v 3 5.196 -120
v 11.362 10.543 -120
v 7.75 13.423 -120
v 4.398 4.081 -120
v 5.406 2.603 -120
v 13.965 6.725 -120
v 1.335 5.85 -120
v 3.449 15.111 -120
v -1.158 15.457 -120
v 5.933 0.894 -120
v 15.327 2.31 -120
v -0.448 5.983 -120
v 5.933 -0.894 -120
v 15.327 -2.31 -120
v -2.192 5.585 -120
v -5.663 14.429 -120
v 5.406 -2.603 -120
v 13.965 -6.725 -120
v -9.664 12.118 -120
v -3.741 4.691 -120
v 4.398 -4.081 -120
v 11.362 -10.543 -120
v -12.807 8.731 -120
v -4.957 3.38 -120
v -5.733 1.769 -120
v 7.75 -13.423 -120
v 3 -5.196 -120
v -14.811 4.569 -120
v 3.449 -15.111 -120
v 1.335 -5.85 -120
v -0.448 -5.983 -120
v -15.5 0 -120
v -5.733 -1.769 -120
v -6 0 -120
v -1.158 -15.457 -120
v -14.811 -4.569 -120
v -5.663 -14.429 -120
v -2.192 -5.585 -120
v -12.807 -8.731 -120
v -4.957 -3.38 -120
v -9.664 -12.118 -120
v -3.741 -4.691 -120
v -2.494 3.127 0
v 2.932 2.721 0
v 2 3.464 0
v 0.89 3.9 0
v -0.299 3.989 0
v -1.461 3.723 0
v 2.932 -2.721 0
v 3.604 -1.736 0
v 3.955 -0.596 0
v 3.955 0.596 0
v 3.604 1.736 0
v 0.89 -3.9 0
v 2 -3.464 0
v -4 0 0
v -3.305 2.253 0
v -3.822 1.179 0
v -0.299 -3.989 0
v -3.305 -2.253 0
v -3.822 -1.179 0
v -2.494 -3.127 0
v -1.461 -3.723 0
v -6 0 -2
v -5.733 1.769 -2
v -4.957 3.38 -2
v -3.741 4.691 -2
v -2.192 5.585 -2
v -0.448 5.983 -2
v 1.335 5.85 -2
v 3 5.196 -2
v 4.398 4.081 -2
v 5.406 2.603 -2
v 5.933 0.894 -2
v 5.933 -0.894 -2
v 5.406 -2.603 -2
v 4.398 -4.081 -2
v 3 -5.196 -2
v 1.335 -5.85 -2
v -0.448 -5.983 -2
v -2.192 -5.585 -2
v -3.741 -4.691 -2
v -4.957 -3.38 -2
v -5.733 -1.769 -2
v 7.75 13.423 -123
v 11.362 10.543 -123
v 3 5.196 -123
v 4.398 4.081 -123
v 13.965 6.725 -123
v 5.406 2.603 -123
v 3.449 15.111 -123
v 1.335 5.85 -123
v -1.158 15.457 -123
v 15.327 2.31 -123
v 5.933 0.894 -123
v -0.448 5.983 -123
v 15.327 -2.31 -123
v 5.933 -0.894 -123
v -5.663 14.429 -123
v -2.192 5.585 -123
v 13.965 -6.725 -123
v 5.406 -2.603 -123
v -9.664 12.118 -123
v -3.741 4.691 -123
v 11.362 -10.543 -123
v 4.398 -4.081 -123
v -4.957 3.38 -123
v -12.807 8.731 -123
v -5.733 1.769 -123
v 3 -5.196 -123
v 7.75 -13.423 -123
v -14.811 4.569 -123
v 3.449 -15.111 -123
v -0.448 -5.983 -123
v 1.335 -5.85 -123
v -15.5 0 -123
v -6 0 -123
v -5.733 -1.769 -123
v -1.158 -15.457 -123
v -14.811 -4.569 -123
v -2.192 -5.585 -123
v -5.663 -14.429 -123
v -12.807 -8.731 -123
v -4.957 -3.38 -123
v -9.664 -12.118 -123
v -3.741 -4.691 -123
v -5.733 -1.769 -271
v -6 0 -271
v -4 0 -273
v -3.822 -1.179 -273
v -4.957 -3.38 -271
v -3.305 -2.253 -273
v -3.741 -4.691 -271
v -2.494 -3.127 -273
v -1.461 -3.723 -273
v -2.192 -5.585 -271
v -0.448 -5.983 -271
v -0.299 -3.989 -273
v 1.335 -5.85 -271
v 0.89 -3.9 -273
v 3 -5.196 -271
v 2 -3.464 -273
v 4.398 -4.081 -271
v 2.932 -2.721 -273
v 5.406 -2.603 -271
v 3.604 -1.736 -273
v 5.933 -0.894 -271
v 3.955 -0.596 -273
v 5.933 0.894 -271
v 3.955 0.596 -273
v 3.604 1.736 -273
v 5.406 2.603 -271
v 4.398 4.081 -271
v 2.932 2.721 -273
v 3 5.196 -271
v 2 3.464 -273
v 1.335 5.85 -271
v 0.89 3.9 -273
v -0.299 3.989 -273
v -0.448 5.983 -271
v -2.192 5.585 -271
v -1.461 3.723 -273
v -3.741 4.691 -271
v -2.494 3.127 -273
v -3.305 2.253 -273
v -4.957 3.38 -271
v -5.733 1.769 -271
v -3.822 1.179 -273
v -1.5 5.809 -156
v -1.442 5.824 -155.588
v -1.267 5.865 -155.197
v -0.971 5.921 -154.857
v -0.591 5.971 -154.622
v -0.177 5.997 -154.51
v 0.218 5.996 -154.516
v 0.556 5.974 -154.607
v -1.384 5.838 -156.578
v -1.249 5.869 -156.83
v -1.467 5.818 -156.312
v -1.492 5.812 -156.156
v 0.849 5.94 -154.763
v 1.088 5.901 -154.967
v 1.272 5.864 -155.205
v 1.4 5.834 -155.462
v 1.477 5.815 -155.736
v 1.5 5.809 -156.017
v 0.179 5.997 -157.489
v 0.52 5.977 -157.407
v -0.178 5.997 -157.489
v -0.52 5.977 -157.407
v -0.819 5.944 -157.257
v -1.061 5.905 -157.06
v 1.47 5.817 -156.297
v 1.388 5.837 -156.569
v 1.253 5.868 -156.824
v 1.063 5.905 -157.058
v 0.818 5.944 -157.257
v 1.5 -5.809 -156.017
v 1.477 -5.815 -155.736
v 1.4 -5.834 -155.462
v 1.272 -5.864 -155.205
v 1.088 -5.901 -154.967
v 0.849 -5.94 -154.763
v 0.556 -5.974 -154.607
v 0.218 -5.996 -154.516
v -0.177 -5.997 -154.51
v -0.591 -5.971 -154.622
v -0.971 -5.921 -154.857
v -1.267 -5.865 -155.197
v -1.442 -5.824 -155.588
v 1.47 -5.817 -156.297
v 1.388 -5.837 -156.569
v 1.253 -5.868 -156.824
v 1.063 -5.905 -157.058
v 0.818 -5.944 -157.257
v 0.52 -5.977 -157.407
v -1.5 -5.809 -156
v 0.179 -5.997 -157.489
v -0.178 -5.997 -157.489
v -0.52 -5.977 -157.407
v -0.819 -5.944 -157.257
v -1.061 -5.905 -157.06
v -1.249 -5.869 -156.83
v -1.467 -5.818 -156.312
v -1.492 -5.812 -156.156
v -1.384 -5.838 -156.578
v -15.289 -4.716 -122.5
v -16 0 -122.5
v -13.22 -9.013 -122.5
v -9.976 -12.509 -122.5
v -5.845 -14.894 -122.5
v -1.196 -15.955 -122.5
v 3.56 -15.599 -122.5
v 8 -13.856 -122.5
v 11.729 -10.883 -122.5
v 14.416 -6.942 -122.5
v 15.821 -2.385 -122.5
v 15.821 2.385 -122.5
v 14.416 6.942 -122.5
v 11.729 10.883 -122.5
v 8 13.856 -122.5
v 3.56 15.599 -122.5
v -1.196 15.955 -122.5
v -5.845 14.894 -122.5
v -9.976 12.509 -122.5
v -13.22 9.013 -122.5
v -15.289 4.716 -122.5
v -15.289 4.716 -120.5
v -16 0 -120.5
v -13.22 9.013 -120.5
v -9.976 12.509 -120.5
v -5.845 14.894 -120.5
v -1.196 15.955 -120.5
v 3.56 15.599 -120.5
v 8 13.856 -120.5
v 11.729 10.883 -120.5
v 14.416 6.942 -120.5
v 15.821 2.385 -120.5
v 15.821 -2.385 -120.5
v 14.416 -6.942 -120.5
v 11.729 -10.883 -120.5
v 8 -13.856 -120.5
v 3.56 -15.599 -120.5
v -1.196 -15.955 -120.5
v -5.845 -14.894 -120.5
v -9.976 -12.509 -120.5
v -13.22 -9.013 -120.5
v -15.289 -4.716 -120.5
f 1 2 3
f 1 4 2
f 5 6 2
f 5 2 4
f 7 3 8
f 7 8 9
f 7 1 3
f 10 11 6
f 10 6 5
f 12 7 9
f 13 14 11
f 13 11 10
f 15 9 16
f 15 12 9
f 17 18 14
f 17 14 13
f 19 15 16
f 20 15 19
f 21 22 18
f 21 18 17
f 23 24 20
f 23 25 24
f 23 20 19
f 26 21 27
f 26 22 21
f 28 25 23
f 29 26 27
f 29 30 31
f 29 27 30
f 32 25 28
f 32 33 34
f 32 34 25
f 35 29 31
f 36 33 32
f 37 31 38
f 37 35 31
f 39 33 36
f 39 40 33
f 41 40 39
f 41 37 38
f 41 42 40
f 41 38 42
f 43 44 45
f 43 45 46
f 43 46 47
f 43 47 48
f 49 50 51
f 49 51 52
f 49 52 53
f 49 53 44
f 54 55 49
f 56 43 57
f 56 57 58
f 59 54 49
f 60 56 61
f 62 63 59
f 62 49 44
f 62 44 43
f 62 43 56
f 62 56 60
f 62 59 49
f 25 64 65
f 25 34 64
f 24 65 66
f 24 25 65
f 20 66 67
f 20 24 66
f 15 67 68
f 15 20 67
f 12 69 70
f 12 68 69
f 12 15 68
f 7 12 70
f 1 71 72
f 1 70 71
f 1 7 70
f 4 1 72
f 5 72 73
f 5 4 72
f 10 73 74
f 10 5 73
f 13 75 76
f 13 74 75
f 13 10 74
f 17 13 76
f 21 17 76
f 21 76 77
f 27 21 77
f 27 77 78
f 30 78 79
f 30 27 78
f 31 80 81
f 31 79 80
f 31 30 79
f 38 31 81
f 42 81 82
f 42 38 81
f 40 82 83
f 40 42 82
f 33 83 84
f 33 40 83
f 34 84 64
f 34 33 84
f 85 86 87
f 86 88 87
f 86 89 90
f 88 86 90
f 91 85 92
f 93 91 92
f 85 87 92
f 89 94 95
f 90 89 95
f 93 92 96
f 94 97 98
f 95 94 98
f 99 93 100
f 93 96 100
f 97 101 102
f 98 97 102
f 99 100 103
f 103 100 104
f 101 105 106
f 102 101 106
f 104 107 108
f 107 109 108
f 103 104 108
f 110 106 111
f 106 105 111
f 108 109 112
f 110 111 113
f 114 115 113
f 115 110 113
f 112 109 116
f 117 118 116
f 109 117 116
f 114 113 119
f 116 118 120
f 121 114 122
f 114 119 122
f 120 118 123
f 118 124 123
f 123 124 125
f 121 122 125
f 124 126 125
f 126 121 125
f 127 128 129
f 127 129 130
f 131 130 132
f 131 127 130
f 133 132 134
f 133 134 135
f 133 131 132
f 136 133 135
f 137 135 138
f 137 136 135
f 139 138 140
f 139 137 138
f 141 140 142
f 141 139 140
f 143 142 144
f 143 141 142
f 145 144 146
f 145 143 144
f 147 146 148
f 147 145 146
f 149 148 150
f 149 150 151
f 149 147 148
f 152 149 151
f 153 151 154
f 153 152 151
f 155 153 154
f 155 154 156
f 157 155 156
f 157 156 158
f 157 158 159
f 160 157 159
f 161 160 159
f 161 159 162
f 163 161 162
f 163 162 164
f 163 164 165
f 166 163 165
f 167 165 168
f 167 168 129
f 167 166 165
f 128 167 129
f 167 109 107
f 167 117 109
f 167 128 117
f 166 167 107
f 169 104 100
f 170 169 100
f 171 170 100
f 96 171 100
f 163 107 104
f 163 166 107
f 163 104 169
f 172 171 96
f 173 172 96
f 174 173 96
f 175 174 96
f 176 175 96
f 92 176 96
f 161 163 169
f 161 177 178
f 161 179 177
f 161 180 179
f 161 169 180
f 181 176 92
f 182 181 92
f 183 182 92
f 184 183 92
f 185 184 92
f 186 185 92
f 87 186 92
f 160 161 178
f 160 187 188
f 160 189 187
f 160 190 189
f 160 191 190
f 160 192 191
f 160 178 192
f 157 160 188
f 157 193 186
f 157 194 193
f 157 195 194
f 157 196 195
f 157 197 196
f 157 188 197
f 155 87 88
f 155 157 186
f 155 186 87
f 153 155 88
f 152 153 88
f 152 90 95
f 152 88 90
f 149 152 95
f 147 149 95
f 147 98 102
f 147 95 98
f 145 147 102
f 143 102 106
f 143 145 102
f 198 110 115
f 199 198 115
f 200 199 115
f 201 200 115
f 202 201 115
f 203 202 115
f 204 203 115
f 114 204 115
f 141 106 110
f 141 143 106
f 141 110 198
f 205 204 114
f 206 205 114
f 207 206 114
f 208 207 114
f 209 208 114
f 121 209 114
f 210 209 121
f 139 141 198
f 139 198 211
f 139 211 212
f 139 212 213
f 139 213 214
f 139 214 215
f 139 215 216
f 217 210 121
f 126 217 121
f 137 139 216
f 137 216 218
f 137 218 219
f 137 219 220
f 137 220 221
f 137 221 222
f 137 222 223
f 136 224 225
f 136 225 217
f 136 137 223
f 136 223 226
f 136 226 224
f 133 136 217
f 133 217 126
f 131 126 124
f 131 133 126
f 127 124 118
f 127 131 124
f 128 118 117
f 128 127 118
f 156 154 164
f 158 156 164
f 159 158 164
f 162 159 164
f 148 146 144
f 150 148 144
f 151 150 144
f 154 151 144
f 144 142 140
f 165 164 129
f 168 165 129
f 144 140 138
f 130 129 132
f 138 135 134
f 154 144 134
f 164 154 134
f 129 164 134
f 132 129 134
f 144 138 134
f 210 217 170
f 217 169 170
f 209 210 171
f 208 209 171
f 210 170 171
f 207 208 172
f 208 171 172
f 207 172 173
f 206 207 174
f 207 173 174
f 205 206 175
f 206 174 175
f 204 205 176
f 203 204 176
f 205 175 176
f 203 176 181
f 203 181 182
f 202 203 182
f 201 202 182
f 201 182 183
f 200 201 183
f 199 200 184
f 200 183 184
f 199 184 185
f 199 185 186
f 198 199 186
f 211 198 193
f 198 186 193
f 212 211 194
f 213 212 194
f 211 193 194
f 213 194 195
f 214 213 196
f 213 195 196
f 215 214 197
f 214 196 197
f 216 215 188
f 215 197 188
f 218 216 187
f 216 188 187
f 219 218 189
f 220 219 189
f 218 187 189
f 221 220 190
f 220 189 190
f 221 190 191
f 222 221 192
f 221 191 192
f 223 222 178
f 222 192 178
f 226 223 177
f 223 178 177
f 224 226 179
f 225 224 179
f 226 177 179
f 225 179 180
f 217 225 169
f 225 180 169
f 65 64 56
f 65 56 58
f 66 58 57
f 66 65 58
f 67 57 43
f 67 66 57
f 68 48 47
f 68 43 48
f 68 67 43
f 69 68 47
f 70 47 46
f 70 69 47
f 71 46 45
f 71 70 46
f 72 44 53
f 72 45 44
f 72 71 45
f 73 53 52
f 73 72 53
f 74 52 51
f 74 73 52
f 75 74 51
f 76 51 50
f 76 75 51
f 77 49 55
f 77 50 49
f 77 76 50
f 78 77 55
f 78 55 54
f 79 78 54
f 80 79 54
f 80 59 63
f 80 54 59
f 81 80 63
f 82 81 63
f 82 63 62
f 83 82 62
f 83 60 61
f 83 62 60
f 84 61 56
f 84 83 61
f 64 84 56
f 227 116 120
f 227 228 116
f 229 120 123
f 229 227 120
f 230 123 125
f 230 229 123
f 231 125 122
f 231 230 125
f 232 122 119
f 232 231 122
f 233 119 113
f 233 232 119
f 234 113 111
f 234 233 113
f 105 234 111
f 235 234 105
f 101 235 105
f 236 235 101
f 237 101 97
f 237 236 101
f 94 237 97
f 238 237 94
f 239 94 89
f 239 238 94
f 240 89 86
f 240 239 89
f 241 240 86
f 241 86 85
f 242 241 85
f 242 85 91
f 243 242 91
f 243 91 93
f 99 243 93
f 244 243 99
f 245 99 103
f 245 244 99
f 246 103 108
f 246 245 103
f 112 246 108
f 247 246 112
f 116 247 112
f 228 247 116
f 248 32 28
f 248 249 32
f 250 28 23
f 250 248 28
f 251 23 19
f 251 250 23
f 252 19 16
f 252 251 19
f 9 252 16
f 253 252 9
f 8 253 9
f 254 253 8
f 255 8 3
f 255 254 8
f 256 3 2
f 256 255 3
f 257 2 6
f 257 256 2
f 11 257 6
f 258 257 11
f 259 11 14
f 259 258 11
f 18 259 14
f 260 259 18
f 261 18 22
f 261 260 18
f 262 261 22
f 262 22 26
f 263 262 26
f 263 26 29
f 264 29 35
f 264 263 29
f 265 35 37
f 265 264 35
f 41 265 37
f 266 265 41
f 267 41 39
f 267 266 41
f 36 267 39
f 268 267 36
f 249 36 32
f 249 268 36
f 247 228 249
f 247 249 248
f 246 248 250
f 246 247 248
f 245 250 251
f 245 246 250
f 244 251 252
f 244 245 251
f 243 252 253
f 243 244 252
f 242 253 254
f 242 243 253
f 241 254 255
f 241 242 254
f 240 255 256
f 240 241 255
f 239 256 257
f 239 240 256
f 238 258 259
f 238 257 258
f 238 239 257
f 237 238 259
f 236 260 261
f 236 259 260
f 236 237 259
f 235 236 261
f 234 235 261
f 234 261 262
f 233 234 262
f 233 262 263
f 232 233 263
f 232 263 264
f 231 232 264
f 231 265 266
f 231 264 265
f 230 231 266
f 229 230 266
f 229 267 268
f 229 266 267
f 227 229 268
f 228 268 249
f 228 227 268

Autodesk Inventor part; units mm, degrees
ref_plane "YZ Plane" through (0, 0, 0) normal (1, 0, 0) x (0, 1, 0)
ref_plane "XZ Plane" through (0, 0, 0) normal (0, 1, 0) x (-1, 0, 0)
ref_plane "XY Plane" through (0, 0, 0) normal (0, 0, 1) x (1, 0, 0)
sketch "Sketch1" plane through (0, 0, 0) normal (0, 1, 0) x (-1, 0, 0)
  line L0 (0, 0) -> (6, 0)
  line L1 (6, 0) -> (6, -120)
  line L2 (6, -120) -> (16, -120)
  line L3 (16, -120) -> (16, -123)
  line L4 (16, -123) -> (6, -123)
  line L5 (6, -123) -> (6, -273)
  line L6 (6, -273) -> (0, -273)
  line L7 (0, -273) -> (0, 0)
  dimension "d0" = 120
  dimension "d1" = 3
  dimension "d2" = 10
  dimension "d3" = 150
  dimension "d4" = 6
revolve "Revolution1" add sketch "Sketch1" angle 360 about axis through (0, 0, -273) along (0, 0, 1)
sketch "Sketch3" plane through (0, 0, 0) normal (0, 1, 0) x (-1, 0, 0)
  circle A0 centre (0, -156) radius 1.5
  line L0 (-16, -123) -> (16, -123) projected
  point P0 (0, 0)
  dimension "d6" = 3
  dimension "d7" = 33
extrude "Extrusion1" cut sketch "Sketch3" along normal through all both and the other way through all
chamfer "Chamfer1" distance 2 angle 45 2 edges at (6, 0, -273) (6, 0, 0)
chamfer "Chamfer2" distance 0.5 angle 45 2 edges at (16, 0, -123) (16, 0, -120)
properties part number "Handle"
